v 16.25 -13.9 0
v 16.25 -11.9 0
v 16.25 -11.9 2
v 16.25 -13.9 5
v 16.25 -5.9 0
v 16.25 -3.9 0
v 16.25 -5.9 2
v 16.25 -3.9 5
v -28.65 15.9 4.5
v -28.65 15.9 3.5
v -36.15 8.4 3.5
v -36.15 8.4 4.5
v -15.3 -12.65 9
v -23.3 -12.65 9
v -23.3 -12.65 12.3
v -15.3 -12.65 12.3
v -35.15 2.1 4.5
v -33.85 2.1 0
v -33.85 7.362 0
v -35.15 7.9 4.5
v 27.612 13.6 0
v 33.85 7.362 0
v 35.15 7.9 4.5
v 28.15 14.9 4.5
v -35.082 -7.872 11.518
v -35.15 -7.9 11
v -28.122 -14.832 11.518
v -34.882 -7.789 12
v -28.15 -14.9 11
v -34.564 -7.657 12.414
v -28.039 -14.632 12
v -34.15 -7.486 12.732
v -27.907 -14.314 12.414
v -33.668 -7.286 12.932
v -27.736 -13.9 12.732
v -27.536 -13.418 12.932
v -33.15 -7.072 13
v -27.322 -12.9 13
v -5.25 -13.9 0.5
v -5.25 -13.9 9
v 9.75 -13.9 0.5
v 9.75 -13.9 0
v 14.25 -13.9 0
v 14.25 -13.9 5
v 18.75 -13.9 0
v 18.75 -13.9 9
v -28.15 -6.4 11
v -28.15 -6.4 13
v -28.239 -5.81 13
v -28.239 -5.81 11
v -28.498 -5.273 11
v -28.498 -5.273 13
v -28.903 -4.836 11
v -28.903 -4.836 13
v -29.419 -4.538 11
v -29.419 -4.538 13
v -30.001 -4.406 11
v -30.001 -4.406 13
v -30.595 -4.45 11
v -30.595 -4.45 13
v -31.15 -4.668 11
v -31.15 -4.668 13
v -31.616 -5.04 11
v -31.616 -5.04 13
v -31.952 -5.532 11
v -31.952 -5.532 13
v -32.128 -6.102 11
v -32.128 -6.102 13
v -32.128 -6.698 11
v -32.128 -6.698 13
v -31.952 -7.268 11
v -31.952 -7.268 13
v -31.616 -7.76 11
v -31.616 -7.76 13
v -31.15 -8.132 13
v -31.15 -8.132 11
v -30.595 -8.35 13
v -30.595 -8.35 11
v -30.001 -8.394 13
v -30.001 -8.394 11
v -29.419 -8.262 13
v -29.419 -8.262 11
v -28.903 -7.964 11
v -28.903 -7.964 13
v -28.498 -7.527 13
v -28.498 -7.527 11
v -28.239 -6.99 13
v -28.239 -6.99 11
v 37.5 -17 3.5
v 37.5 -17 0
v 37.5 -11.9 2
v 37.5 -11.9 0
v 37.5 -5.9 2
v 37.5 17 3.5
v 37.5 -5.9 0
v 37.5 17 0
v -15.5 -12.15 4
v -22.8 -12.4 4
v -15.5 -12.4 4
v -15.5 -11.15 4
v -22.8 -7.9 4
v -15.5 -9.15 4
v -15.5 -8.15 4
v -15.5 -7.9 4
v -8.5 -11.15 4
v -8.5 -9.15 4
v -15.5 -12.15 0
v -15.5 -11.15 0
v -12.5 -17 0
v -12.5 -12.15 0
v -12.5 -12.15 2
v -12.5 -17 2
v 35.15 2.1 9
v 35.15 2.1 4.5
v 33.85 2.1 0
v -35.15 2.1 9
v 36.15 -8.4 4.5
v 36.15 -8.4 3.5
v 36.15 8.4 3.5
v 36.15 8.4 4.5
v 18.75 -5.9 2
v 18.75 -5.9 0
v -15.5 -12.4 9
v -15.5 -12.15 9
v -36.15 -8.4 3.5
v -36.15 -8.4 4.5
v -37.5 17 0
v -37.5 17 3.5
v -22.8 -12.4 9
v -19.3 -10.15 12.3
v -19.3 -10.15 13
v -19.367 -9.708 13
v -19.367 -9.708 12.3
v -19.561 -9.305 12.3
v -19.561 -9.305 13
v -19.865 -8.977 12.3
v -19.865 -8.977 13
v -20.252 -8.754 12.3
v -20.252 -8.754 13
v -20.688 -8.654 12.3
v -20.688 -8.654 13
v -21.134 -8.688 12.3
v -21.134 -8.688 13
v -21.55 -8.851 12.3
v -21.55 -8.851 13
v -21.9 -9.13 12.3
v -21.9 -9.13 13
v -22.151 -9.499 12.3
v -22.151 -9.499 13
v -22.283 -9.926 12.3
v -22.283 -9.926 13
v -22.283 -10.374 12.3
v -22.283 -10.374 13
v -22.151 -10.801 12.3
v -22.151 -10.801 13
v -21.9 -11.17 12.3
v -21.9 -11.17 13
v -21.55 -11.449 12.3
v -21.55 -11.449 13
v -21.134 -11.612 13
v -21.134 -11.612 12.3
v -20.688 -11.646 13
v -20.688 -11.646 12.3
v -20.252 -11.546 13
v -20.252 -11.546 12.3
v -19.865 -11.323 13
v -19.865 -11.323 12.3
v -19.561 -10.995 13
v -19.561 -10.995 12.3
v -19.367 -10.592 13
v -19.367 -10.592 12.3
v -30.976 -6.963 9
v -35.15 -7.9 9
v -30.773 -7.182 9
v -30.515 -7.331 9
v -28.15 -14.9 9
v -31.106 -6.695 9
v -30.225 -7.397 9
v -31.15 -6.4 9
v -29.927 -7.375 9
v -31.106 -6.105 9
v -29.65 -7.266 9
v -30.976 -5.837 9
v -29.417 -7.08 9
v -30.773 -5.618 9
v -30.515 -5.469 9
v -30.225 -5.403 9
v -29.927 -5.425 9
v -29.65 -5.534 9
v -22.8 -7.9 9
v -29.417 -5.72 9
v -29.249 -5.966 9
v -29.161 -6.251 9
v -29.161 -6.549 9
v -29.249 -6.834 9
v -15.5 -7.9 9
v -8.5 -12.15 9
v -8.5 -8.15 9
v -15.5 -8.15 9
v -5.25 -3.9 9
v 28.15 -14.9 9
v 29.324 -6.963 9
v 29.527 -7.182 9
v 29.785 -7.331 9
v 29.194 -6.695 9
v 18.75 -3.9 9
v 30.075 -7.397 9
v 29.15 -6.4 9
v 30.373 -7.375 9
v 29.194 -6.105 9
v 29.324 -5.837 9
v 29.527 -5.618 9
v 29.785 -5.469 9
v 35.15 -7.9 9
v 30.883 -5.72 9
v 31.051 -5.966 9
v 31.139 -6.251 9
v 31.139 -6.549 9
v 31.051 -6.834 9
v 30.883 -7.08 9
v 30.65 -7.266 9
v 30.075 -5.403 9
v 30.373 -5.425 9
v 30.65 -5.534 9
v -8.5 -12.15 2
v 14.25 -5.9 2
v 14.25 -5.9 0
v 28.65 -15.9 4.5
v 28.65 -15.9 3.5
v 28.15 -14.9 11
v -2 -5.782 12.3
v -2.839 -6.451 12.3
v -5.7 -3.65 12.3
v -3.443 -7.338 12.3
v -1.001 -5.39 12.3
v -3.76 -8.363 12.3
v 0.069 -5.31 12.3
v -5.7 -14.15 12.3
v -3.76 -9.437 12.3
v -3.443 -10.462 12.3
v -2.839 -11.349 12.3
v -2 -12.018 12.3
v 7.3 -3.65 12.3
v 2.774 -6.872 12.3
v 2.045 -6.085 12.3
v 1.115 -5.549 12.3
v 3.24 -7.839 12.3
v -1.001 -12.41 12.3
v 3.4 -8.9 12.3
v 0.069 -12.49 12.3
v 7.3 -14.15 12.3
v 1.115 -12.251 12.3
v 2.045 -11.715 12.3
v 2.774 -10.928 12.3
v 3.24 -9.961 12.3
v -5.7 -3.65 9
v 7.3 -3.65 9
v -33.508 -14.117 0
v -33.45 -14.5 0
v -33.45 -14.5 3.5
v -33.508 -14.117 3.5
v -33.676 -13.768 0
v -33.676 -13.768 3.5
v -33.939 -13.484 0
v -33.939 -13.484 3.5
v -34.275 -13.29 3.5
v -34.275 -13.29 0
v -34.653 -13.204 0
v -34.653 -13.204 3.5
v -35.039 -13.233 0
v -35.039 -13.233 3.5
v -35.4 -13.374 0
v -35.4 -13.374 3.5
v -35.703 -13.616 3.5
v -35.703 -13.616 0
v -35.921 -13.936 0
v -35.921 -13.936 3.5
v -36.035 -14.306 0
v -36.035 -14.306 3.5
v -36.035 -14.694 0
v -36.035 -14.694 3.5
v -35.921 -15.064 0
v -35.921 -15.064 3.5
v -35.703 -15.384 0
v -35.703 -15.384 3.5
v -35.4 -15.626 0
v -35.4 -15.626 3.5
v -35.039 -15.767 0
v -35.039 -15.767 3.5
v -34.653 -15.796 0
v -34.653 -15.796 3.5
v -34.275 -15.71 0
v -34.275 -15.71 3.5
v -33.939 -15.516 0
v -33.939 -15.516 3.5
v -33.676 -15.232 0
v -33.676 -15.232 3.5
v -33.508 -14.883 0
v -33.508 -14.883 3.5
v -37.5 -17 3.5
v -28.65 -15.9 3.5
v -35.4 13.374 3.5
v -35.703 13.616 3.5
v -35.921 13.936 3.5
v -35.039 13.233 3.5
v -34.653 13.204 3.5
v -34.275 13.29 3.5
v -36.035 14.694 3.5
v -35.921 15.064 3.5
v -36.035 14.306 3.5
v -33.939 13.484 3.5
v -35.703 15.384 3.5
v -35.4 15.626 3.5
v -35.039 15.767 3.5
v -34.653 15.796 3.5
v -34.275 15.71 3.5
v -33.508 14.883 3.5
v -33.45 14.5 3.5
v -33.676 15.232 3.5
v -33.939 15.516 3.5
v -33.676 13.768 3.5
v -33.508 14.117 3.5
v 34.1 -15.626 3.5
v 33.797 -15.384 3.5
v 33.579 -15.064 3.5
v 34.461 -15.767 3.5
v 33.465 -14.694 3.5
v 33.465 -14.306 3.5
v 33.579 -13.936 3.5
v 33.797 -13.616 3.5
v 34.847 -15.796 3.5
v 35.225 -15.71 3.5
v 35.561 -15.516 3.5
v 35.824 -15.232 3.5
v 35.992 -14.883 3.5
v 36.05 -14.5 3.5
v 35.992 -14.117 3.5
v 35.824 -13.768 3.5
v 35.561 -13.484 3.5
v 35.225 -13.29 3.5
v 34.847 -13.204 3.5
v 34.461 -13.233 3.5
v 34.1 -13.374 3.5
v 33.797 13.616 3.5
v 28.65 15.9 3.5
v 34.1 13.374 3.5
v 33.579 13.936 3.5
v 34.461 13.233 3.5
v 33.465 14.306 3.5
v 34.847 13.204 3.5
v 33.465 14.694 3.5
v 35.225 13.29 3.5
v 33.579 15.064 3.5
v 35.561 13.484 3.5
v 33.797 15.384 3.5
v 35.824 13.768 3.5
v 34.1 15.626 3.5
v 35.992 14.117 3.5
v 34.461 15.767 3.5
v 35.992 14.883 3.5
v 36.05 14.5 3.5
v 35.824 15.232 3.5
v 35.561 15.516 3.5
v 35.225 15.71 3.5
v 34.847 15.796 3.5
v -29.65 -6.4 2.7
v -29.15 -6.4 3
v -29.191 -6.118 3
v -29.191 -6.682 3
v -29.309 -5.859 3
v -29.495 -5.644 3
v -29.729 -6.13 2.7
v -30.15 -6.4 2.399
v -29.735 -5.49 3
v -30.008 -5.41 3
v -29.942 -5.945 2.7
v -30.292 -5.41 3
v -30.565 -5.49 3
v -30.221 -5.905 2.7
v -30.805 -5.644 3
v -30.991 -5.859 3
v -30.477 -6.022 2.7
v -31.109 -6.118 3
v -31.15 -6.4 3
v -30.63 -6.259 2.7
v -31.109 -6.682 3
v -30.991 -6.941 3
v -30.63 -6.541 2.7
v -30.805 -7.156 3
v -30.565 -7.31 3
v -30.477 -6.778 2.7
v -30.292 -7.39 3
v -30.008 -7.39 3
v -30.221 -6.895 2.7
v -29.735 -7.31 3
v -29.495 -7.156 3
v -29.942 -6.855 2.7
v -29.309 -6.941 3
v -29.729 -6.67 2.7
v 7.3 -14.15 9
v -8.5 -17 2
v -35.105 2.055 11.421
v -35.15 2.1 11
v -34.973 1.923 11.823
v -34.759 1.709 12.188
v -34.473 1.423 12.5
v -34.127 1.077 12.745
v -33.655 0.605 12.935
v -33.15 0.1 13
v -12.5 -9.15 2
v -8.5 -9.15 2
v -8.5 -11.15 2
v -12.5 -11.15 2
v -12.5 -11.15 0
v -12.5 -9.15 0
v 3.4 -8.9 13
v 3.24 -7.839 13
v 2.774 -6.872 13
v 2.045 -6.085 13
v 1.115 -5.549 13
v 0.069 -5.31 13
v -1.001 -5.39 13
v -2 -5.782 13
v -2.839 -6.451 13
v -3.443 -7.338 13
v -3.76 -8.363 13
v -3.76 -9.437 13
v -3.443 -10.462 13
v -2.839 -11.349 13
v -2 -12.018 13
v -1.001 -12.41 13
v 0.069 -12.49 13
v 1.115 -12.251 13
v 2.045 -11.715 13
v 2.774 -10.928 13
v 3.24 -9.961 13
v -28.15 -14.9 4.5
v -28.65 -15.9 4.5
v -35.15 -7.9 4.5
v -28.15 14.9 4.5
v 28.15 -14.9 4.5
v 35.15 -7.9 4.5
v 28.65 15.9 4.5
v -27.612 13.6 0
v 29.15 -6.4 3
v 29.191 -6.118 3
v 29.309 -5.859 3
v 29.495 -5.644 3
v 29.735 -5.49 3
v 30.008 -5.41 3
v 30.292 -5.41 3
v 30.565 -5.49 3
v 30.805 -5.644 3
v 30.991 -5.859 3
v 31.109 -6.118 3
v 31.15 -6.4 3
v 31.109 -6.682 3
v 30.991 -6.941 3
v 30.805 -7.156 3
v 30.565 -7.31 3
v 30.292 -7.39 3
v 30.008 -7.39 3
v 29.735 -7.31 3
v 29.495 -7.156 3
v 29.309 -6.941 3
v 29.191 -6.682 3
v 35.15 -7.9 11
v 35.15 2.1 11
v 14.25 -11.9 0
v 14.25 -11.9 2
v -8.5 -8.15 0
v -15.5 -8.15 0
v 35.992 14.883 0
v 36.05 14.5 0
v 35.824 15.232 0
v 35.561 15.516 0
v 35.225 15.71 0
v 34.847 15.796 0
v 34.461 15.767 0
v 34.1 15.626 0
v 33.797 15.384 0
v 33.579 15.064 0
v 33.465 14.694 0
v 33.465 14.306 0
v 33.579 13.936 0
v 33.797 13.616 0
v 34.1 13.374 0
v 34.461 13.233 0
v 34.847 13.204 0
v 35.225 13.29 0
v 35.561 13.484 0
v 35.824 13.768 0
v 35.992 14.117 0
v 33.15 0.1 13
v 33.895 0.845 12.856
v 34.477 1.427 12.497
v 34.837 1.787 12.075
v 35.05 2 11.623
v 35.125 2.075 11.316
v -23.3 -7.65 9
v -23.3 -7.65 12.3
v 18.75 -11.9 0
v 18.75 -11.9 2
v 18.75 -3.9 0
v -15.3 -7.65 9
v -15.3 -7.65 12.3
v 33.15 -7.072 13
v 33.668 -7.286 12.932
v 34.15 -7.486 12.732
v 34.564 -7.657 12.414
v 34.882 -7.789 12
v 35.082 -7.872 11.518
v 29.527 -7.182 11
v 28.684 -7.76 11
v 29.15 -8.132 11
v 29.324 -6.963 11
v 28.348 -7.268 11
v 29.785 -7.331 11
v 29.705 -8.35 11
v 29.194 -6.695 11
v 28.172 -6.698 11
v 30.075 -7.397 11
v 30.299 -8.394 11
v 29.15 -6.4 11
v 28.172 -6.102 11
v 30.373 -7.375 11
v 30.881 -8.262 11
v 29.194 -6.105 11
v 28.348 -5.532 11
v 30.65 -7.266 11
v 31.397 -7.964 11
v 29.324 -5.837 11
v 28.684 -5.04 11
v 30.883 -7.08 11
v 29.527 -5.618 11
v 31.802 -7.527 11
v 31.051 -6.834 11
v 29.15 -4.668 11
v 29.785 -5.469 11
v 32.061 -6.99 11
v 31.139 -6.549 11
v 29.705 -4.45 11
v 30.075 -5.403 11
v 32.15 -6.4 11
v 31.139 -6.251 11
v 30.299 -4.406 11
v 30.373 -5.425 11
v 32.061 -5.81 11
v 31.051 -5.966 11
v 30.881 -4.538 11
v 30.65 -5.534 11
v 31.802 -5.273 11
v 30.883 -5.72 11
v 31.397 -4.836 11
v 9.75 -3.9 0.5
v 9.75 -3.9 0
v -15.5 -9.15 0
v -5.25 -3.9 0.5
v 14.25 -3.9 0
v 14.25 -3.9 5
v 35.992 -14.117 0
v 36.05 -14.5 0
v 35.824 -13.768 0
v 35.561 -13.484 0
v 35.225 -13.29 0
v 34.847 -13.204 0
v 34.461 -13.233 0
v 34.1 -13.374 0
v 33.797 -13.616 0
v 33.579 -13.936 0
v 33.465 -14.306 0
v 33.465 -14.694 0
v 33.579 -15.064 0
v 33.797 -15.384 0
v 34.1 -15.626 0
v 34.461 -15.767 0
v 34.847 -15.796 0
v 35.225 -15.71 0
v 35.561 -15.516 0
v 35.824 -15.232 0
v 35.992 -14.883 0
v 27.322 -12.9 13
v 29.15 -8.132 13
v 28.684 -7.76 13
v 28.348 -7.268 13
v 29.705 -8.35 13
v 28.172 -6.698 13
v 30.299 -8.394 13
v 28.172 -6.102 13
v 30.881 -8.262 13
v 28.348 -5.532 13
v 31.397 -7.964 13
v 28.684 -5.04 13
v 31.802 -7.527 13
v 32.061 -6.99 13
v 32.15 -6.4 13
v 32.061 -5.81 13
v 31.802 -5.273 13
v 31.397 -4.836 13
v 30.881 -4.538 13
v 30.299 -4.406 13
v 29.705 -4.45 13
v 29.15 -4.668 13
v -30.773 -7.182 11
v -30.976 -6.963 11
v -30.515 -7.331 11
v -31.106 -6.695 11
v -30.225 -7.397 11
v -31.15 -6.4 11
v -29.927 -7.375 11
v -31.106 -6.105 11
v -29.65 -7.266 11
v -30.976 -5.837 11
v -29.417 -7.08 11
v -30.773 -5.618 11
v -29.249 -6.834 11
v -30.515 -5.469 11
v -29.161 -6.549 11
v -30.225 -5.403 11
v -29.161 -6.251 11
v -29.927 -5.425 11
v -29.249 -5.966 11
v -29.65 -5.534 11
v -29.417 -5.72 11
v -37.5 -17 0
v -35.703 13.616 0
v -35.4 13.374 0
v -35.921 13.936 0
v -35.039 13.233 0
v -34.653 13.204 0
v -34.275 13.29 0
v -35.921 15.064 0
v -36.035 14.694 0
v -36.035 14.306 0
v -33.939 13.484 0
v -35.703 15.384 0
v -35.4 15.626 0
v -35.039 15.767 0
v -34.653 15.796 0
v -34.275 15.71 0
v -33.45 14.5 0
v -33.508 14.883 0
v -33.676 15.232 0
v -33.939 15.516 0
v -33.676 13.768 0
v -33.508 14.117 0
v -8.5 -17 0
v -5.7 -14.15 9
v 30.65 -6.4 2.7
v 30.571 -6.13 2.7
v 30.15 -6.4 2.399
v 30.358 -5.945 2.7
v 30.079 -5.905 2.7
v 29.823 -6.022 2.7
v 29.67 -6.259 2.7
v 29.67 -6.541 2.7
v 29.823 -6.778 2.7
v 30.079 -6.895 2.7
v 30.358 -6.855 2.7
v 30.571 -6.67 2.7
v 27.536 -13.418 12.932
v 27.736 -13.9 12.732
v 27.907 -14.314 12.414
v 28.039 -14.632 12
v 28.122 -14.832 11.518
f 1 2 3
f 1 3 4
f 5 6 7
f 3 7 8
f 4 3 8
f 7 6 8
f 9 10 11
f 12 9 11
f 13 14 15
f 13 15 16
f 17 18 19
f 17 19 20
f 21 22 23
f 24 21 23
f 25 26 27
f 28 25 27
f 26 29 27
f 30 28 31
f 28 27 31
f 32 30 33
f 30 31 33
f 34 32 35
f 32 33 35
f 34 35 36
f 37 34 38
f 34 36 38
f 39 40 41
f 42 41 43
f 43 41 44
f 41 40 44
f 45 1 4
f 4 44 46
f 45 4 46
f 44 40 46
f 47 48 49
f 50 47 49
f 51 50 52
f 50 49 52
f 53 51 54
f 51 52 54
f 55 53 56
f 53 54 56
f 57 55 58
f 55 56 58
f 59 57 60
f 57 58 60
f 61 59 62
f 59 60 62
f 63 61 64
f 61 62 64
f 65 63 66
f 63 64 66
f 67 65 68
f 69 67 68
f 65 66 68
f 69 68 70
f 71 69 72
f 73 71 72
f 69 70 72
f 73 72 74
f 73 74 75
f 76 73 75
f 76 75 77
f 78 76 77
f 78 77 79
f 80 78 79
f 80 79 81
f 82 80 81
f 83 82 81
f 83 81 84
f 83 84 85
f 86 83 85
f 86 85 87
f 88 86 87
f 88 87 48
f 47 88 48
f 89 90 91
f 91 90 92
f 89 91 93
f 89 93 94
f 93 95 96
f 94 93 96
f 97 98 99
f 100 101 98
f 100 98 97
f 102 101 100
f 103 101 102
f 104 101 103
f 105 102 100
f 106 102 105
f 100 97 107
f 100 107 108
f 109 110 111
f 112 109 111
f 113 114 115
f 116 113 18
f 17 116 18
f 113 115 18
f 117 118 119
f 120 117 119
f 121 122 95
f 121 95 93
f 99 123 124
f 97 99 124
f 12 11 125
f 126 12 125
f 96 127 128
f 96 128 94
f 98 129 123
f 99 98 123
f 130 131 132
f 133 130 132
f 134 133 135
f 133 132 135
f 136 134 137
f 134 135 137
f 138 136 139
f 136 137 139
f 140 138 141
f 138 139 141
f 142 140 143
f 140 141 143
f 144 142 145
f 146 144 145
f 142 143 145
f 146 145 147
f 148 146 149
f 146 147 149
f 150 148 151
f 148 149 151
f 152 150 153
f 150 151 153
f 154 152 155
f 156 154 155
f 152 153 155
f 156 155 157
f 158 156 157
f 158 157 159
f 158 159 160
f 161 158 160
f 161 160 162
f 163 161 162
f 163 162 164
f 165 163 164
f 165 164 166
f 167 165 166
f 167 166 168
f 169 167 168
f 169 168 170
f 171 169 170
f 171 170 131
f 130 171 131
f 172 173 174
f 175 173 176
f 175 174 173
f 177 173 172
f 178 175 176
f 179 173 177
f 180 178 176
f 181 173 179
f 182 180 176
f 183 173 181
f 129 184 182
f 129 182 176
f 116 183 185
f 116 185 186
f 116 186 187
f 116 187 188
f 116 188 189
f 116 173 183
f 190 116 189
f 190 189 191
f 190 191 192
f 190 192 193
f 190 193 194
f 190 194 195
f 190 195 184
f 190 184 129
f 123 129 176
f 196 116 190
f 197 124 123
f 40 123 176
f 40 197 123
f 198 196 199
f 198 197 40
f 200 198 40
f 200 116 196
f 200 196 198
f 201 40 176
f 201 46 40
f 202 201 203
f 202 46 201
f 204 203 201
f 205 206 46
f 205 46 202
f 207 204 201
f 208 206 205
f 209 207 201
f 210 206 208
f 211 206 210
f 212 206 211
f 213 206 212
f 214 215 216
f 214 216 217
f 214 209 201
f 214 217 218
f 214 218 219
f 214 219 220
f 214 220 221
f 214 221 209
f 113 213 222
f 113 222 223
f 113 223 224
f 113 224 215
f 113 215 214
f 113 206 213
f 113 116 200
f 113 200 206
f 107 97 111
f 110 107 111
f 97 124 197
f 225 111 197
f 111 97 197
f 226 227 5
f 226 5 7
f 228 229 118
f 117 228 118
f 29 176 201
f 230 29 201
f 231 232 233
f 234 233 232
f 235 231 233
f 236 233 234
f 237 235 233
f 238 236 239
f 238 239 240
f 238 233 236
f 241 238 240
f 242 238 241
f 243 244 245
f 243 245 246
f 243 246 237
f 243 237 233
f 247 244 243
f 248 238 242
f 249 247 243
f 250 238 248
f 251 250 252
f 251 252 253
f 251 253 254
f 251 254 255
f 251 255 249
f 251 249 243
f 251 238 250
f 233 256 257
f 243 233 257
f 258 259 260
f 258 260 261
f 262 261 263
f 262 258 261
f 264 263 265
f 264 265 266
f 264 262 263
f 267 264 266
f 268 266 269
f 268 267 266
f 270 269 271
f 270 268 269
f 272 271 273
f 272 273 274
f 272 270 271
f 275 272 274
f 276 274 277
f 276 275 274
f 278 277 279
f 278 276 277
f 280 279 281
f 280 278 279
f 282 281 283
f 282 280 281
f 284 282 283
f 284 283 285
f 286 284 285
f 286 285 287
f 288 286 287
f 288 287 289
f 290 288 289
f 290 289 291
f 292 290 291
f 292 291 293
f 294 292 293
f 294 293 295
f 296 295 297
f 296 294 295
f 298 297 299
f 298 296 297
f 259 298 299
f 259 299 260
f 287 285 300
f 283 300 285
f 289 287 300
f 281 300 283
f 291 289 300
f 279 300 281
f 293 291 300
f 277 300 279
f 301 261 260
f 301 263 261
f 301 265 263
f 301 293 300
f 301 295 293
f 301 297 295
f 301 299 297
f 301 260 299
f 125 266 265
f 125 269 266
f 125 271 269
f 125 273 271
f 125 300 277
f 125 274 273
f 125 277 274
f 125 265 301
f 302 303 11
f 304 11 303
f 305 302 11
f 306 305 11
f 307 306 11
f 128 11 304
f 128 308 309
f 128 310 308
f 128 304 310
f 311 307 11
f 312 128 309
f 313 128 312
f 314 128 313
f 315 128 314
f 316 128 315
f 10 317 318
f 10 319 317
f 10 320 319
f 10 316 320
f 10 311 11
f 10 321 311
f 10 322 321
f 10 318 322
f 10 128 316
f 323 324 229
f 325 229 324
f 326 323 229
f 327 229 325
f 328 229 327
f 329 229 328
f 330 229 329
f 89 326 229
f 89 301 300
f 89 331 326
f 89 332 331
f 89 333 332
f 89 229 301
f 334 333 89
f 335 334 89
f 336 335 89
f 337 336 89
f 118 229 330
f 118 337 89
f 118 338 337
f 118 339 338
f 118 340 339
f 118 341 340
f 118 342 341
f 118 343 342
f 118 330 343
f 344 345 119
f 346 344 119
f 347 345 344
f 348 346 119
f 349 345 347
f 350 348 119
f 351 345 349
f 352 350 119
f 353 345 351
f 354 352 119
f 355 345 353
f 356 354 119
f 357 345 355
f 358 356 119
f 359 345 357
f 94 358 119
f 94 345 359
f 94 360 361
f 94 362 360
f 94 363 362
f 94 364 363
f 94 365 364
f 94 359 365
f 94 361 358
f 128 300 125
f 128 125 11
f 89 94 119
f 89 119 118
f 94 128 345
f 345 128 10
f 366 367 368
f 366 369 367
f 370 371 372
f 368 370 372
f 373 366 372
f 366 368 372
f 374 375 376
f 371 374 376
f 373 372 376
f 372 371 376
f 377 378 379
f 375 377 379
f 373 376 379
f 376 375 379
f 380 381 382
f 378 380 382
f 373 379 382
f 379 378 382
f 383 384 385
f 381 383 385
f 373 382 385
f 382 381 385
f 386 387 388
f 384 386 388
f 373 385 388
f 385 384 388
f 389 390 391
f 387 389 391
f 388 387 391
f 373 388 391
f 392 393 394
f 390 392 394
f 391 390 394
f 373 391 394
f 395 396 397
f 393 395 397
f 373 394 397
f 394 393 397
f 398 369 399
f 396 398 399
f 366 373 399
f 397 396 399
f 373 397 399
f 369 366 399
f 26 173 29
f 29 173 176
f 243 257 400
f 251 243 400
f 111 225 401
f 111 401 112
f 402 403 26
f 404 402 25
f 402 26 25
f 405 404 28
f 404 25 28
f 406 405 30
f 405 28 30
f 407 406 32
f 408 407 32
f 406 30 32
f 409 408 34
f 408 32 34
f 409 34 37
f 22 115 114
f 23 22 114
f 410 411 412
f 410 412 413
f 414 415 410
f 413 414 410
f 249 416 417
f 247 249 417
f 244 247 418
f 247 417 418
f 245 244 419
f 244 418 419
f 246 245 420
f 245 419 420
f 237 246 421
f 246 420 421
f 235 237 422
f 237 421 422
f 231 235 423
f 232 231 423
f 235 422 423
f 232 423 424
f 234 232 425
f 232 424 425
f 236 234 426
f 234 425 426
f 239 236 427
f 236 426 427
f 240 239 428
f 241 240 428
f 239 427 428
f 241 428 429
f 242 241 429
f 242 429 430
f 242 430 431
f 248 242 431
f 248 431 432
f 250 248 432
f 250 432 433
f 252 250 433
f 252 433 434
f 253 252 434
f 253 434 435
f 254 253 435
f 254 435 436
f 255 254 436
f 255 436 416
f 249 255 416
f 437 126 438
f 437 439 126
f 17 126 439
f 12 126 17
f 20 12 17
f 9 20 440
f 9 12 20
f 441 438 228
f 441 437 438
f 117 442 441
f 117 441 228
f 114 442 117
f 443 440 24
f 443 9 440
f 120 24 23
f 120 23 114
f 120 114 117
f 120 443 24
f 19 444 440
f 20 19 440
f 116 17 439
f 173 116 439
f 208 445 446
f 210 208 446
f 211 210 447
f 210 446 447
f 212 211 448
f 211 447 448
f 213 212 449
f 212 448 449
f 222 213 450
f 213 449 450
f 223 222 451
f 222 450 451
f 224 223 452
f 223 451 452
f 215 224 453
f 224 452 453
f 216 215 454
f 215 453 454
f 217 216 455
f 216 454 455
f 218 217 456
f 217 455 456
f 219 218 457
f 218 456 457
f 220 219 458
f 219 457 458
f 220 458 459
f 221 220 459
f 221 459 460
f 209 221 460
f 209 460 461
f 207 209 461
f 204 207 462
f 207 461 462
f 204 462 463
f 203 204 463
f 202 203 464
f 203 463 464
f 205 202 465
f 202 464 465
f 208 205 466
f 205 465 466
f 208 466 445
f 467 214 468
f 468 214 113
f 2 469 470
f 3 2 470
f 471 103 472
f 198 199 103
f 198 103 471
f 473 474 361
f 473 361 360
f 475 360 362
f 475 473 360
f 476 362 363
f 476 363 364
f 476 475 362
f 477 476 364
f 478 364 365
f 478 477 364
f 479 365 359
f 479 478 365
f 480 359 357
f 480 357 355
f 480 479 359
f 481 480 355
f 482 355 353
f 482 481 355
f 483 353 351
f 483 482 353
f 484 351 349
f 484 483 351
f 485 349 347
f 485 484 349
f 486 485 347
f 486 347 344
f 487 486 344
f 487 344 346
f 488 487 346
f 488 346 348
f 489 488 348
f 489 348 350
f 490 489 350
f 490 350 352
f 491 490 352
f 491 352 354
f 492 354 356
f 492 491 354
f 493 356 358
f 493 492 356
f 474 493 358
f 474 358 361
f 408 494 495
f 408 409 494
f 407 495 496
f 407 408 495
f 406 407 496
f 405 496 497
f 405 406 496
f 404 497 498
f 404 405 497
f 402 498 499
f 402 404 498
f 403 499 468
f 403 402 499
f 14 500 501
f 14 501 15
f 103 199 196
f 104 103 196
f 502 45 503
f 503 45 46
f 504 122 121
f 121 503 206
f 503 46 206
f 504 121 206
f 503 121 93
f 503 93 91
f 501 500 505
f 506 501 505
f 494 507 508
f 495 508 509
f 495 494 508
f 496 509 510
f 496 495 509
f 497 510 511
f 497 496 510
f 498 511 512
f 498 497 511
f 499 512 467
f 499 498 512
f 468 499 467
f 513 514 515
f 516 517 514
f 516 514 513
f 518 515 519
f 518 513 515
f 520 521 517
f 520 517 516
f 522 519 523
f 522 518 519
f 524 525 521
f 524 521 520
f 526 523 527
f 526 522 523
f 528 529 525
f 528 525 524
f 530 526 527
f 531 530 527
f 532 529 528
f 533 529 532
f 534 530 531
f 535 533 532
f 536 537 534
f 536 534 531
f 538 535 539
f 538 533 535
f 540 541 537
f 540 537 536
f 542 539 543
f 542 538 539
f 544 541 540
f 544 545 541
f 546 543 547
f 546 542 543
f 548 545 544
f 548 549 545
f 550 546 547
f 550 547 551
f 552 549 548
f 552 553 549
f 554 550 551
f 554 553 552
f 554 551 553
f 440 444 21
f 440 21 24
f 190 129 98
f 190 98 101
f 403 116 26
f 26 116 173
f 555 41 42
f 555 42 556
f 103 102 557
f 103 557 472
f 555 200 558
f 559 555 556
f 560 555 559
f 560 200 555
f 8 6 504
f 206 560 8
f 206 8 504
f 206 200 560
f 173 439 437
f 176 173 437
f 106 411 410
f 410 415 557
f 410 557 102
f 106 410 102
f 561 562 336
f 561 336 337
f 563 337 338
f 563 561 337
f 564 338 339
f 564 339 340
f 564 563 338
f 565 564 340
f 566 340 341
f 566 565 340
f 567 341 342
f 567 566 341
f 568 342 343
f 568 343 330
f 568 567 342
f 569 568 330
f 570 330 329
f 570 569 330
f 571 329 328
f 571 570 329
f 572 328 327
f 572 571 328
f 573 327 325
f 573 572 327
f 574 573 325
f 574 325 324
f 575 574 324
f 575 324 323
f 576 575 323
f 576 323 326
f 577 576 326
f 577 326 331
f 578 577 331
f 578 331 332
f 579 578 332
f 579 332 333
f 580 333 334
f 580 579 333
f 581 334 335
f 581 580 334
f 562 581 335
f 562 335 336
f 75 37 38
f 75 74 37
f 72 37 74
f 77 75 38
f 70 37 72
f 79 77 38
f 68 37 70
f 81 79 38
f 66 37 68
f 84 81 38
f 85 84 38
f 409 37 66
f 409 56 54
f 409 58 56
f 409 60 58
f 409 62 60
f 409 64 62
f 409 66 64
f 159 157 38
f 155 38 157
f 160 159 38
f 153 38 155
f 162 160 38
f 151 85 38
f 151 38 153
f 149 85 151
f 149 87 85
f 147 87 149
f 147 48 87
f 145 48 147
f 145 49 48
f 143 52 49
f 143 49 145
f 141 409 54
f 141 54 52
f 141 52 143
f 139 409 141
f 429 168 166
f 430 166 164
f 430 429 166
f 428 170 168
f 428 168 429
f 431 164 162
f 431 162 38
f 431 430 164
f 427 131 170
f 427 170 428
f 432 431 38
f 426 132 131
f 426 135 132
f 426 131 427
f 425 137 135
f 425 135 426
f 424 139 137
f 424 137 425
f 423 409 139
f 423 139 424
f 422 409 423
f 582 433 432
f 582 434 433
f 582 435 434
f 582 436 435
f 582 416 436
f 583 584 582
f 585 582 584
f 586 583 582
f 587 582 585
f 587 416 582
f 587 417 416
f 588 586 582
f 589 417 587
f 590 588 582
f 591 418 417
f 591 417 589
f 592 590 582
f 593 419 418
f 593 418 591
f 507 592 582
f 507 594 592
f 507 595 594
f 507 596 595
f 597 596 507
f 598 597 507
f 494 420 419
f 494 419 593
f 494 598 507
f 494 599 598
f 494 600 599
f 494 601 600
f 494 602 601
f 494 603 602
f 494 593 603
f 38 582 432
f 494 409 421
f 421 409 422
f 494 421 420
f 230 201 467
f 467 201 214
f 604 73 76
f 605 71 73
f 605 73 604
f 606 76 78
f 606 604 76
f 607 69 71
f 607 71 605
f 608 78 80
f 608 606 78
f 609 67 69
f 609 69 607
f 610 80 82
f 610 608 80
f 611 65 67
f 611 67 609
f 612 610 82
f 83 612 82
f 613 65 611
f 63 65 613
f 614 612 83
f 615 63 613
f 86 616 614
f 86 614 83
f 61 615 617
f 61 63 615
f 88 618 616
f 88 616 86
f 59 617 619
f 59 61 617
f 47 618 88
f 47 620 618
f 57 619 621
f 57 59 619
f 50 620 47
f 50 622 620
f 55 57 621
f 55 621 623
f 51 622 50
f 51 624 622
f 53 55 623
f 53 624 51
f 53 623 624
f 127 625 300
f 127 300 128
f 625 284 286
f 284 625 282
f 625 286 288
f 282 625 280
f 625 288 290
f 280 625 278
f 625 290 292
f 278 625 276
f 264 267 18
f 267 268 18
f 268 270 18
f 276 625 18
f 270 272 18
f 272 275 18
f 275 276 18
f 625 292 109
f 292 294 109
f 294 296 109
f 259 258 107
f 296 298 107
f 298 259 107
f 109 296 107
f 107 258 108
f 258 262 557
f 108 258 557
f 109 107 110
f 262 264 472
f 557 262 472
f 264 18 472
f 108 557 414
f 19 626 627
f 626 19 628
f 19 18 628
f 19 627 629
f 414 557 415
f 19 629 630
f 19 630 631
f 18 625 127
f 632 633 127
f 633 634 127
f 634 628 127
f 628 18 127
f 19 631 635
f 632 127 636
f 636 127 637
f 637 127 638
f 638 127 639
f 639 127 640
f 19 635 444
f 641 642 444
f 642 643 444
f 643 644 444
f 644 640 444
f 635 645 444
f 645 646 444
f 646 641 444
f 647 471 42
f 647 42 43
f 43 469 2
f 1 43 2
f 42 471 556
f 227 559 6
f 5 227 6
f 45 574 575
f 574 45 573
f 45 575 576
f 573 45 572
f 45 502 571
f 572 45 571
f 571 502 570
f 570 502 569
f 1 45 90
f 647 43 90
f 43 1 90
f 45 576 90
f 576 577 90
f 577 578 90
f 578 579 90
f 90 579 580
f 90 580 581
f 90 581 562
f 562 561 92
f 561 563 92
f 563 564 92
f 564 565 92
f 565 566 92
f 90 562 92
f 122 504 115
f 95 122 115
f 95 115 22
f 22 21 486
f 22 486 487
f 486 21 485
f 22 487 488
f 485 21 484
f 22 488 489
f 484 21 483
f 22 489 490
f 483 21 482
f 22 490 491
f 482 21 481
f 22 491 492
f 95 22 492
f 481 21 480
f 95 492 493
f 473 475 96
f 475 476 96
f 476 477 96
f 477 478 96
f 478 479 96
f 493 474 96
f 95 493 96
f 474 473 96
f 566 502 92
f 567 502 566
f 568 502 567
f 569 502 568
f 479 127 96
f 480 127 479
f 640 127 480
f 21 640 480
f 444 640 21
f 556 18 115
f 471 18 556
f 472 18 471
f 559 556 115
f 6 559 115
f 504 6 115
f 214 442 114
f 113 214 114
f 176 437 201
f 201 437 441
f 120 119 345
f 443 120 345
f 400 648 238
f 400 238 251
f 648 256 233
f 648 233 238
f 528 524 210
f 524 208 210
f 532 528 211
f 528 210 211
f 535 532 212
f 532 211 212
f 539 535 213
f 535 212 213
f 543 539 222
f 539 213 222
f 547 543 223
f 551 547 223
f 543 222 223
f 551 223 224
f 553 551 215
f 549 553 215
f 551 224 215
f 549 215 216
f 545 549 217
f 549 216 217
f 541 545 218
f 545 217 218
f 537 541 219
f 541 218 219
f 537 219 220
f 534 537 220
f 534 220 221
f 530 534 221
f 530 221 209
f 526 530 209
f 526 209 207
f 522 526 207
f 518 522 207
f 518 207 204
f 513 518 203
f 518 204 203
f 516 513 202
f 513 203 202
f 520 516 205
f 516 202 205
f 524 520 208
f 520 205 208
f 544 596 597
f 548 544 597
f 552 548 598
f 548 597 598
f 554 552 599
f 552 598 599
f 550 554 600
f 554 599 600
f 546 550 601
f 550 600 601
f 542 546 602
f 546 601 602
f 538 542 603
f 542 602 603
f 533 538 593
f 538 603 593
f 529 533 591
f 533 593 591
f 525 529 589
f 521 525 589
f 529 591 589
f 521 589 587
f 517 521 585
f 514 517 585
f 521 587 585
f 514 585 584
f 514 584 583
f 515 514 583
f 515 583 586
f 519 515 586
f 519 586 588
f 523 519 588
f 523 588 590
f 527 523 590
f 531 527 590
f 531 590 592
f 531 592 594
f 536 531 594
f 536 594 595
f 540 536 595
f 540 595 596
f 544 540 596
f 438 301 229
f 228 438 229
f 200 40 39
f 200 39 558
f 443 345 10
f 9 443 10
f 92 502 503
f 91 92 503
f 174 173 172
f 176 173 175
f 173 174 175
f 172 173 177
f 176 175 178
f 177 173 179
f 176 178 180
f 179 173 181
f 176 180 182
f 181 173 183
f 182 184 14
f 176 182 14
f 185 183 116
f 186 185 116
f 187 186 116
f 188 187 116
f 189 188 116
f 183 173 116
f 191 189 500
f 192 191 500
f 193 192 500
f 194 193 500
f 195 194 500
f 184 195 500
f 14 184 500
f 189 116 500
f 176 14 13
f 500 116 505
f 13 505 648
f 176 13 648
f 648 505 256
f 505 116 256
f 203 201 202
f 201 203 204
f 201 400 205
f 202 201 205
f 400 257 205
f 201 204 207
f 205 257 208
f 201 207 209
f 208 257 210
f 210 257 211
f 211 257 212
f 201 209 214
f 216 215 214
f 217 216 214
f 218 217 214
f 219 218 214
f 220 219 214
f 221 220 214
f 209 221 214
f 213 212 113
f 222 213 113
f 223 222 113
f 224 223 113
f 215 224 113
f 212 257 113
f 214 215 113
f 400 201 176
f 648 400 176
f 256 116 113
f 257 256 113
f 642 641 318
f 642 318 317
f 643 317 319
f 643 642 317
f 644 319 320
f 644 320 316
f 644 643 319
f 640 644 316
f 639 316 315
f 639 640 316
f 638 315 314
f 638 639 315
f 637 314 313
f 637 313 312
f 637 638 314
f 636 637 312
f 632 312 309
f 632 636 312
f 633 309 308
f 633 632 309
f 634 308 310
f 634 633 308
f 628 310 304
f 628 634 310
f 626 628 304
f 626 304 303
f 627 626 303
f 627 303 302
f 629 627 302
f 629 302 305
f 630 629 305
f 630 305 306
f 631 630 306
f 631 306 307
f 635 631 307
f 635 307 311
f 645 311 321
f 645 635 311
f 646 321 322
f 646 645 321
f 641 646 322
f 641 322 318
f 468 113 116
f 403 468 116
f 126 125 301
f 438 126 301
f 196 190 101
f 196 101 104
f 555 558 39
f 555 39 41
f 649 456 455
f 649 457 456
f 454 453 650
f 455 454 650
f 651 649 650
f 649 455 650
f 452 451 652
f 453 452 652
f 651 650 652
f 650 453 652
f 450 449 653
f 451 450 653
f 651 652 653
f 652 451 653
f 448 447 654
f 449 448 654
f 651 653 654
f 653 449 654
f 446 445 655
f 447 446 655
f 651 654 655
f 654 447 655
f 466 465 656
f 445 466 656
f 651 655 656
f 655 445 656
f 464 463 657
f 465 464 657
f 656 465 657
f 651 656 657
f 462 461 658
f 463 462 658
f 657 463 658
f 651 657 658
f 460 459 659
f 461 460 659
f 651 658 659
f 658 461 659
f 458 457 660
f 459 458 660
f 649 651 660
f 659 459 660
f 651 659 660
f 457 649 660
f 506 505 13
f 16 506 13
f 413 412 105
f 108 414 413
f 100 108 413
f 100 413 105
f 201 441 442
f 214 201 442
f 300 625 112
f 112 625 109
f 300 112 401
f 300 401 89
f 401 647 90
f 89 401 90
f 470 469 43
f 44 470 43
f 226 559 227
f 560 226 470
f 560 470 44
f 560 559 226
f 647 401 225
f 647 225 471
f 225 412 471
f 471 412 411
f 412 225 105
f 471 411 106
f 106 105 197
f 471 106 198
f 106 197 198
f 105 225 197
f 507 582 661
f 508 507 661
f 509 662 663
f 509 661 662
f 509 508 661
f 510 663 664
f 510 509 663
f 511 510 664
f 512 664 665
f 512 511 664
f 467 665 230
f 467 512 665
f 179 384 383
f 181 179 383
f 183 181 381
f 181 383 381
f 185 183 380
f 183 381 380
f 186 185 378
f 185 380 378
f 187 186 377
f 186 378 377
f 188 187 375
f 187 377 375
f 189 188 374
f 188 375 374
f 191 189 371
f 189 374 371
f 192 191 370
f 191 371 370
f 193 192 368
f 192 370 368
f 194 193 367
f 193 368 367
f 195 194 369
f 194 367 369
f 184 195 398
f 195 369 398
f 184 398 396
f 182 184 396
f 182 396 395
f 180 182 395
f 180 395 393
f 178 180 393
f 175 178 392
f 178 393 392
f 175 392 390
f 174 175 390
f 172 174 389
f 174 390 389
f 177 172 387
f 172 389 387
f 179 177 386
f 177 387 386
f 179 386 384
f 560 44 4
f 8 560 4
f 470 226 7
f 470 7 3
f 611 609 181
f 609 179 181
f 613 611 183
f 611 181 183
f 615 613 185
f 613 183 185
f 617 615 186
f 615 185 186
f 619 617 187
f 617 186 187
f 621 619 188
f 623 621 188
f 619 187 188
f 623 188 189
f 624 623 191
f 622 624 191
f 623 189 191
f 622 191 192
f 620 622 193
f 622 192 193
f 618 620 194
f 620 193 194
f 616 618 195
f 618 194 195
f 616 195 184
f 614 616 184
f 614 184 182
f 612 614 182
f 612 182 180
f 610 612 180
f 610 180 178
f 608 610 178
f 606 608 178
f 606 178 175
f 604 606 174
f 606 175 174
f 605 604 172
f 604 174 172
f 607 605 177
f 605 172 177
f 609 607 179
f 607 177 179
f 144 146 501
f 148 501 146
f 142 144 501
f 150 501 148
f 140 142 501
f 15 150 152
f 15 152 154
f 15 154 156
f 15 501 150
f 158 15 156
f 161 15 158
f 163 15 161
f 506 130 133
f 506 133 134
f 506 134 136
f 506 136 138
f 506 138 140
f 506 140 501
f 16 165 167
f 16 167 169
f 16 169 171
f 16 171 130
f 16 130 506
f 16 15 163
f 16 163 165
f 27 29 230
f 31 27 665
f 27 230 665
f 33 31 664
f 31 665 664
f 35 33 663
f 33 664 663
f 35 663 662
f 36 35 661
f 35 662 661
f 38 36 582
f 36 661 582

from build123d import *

# Parameters (mm, degrees)
F0_W              = 75
F0_H              = 34
F0_R              = 1.3
F1_DEPTH          = 3.5
F3_DEPTH          = 1
F5_DEPTH          = 5
F11_DEPTH         = 9
F12_W             = 15
F12_H             = 10
F13_DEPTH         = 8.5
F14_W             = 7.3
F14_H             = 4.5
F15_DEPTH         = 5
F16_W             = 9
F16_H             = 10
F16_W_2           = 7
F16_H_2           = 4
F17_DEPTH         = 25
F18_W             = 2
F18_H             = 5
F19_DEPTH         = 10
F20_W             = 6
F20_H             = 2
F21_DEPTH         = 25
F22_R             = 0.8
F23_DEPTH         = 5
F26_DEPTH         = 4
F27_R             = 3.6
F27_R_2           = 1.5
F28_DEPTH         = 25
F29_W             = 13
F29_H             = 10.5
F29_W_2           = 8
F29_H_2           = 5
F30_DEPTH         = 3.3
F31_W             = 2
F31_H             = 4
F32_DEPTH         = 7
F33_W             = 4
F33_H             = 2
F34_DEPTH         = 25
F36_D             = 2
F36_DEPTH         = 10
F36_CBORE_D       = 4
F36_CBORE_DEPTH   = 2
F36_TIP           = 0.600860619
F36_2_D           = 2
F36_2_DEPTH       = 10
F36_2_CBORE_D     = 4
F36_2_CBORE_DEPTH = 2
F36_2_TIP         = 0.600860619
F37_R             = 2


with BuildPart() as f1:
    # F0 (on Top) → F1 (new body)
    with BuildSketch(Plane.XY):
        Rectangle(F0_W, F0_H)
        with Locations((-34.75, -14.5)):
            Circle(F0_R, mode=Mode.SUBTRACT)
        with Locations((34.75, -14.5)):
            Circle(F0_R, mode=Mode.SUBTRACT)
        with Locations((-34.75, 14.5)):
            Circle(F0_R, mode=Mode.SUBTRACT)
        with Locations((34.75, 14.5)):
            Circle(F0_R, mode=Mode.SUBTRACT)
    extrude(amount=F1_DEPTH)

    # F2 (on face) → F3 (join)
    with BuildSketch(Plane.XY.offset(3.5)):
        Polygon((28.65, 15.9), (-28.65, 15.9), (-36.15, 8.4), (-36.15, -8.4), (-28.65, -15.9), (28.65, -15.9), (36.15, -8.4), (36.15, 8.4), align=None)
    extrude(amount=F3_DEPTH)

    # F4 (on face) → F5 (cut)
    with BuildSketch(Plane.XY.offset(4.5)):
        Polygon((28.15, 14.9), (-28.15, 14.9), (-35.15, 7.9), (-35.15, -7.9), (-28.15, -14.9), (28.15, -14.9), (35.15, -7.9), (35.15, 7.9), align=None)
    extrude(amount=-F5_DEPTH, mode=Mode.SUBTRACT)

    # F9: sweep along a path in F8
    with BuildLine(Plane.XY.offset(4.5)) as f9_path:
        Line((-35.15, 2.1), (-35.15, 7.9))
        Line((-35.15, 7.9), (-28.15, 14.9))
        Line((-28.15, 14.9), (28.15, 14.9))
        Line((28.15, 14.9), (35.15, 7.9))
        Line((35.15, 7.9), (35.15, 2.1))
    # F7 (on offset) → F9 (sweep)
    with BuildSketch(Plane.XZ.offset(-2.1)):
        Polygon((-33.85, 0), (-35.15, 4.5), (-35.15, 0), align=None)
    sweep(path=f9_path.line, transition=Transition.RIGHT)

    # F10 (on Top) → F11 (join)
    with BuildSketch(Plane.XY):
        Polygon((-35.15, -7.9), (-28.15, -14.9), (28.15, -14.9), (35.15, -7.9), (35.15, 2.1), (-35.15, 2.1), align=None)
    extrude(amount=F11_DEPTH)

    # F12 (on face) → F13 (cut)
    with BuildSketch(Plane.XY.offset(9)):
        with Locations((2.25, -8.9)):
            Rectangle(F12_W, F12_H)
    extrude(amount=-F13_DEPTH, mode=Mode.SUBTRACT)

    # F14 (on face) → F15 (cut)
    with BuildSketch(Plane.XY.offset(9)):
        with Locations((-19.15, -10.15)):
            Rectangle(F14_W, F14_H)
    extrude(amount=-F15_DEPTH, mode=Mode.SUBTRACT)

    # F16 (on face) → F17 (cut)
    with BuildSketch(Plane.XY.offset(9)):
        with Locations((14.25, -8.9)):
            Rectangle(F16_W, F16_H)
        with Locations((-12, -10.15)):
            Rectangle(F16_W_2, F16_H_2)
    extrude(amount=-F17_DEPTH, mode=Mode.SUBTRACT)

    # F18 (on face) → F19 (join)
    with BuildSketch(Plane.XZ.offset(3.9)):
        with Locations((15.25, 2.5)):
            Rectangle(F18_W, F18_H)
    extrude(amount=F19_DEPTH)

    # F20 (on face) → F21 (cut)
    with BuildSketch(Plane(origin=(14.25, 0, 0), x_dir=(0, -1, 0), z_dir=(-1, 0, 0))):
        with Locations((8.9, 1)):
            Rectangle(F20_W, F20_H)
    extrude(amount=-F21_DEPTH, mode=Mode.SUBTRACT)

    # F22 (on face) → F23 (cut)
    with BuildSketch(Plane.XY.offset(9)):
        with Locations((-30.15, -6.4)):
            Circle(F22_R)
        with Locations((30.15, -6.4)):
            Circle(F22_R)
    extrude(amount=-F23_DEPTH, mode=Mode.SUBTRACT)

    # F31 (on face) → F32 (join)
    with BuildSketch(Plane.YZ.offset(-15.5)):
        with Locations((-10.15, 2)):
            Rectangle(F31_W, F31_H)
    extrude(amount=F32_DEPTH)

    # F33 (on face) → F34 (cut)
    with BuildSketch(Plane(origin=(0, -9.15, 0), x_dir=(-1, 0, 0), z_dir=(0, 1, 0))):
        with Locations((10.5, 1)):
            Rectangle(F33_W, F33_H)
    extrude(amount=-F34_DEPTH, mode=Mode.SUBTRACT)

    # F36
    with Locations(Plane.XY.offset(13)):
        with Locations((-30.15, -6.4), (30.15, -6.4)):
            CounterBoreHole(F36_D / 2, F36_CBORE_D / 2, F36_CBORE_DEPTH, depth=F36_DEPTH)
            with Locations((0, 0, -(F36_DEPTH + F36_TIP / 2))):  # 118° drill point
                Cone(0, F36_D / 2, F36_TIP, mode=Mode.SUBTRACT)


with BuildPart() as f26:
    # F25 (on offset) → F26 (new body)
    with BuildSketch(Plane.XY.offset(9)):
        Polygon((-35.15, -7.9), (-28.15, -14.9), (28.15, -14.9), (35.15, -7.9), (35.15, 2.1), (-35.15, 2.1), align=None)
    extrude(amount=F26_DEPTH)

    # F27 (on face) → F28 (cut)
    with BuildSketch(Plane.XY.offset(13)):
        with Locations((-0.2, -8.9)):
            Circle(F27_R)
        with Locations((-20.8, -10.15)):
            Circle(F27_R_2)
    extrude(amount=-F28_DEPTH, mode=Mode.SUBTRACT)

    # F29 (on face) → F30 (cut)
    with BuildSketch(Plane(origin=(0, 0, 9), x_dir=(1, 0, 0), z_dir=(0, 0, -1))):
        with Locations((0.8, 8.9)):
            Rectangle(F29_W, F29_H)
        with Locations((-19.3, 10.15)):
            Rectangle(F29_W_2, F29_H_2)
    extrude(amount=-F30_DEPTH, mode=Mode.SUBTRACT)

    # F36#2
    with Locations(Plane.XY.offset(13)):
        with Locations((-30.15, -6.4), (30.15, -6.4)):
            CounterBoreHole(F36_2_D / 2, F36_2_CBORE_D / 2, F36_2_CBORE_DEPTH, depth=F36_2_DEPTH)
            with Locations((0, 0, -(F36_2_DEPTH + F36_2_TIP / 2))):  # 118° drill point
                Cone(0, F36_2_D / 2, F36_2_TIP, mode=Mode.SUBTRACT)

    # F37
    f37_edges = [f26.edges().sort_by_distance(p)[0] for p in [
        (0, -14.9, 13),
        (-31.65, -11.4, 13),
        (-35.15, -2.9, 13),
        (0, 2.1, 13),
        (35.15, -2.9, 13),
        (31.65, -11.4, 13),
    ]]
    fillet(f37_edges, radius=F37_R)


solid = Compound([f1.part, f26.part])
